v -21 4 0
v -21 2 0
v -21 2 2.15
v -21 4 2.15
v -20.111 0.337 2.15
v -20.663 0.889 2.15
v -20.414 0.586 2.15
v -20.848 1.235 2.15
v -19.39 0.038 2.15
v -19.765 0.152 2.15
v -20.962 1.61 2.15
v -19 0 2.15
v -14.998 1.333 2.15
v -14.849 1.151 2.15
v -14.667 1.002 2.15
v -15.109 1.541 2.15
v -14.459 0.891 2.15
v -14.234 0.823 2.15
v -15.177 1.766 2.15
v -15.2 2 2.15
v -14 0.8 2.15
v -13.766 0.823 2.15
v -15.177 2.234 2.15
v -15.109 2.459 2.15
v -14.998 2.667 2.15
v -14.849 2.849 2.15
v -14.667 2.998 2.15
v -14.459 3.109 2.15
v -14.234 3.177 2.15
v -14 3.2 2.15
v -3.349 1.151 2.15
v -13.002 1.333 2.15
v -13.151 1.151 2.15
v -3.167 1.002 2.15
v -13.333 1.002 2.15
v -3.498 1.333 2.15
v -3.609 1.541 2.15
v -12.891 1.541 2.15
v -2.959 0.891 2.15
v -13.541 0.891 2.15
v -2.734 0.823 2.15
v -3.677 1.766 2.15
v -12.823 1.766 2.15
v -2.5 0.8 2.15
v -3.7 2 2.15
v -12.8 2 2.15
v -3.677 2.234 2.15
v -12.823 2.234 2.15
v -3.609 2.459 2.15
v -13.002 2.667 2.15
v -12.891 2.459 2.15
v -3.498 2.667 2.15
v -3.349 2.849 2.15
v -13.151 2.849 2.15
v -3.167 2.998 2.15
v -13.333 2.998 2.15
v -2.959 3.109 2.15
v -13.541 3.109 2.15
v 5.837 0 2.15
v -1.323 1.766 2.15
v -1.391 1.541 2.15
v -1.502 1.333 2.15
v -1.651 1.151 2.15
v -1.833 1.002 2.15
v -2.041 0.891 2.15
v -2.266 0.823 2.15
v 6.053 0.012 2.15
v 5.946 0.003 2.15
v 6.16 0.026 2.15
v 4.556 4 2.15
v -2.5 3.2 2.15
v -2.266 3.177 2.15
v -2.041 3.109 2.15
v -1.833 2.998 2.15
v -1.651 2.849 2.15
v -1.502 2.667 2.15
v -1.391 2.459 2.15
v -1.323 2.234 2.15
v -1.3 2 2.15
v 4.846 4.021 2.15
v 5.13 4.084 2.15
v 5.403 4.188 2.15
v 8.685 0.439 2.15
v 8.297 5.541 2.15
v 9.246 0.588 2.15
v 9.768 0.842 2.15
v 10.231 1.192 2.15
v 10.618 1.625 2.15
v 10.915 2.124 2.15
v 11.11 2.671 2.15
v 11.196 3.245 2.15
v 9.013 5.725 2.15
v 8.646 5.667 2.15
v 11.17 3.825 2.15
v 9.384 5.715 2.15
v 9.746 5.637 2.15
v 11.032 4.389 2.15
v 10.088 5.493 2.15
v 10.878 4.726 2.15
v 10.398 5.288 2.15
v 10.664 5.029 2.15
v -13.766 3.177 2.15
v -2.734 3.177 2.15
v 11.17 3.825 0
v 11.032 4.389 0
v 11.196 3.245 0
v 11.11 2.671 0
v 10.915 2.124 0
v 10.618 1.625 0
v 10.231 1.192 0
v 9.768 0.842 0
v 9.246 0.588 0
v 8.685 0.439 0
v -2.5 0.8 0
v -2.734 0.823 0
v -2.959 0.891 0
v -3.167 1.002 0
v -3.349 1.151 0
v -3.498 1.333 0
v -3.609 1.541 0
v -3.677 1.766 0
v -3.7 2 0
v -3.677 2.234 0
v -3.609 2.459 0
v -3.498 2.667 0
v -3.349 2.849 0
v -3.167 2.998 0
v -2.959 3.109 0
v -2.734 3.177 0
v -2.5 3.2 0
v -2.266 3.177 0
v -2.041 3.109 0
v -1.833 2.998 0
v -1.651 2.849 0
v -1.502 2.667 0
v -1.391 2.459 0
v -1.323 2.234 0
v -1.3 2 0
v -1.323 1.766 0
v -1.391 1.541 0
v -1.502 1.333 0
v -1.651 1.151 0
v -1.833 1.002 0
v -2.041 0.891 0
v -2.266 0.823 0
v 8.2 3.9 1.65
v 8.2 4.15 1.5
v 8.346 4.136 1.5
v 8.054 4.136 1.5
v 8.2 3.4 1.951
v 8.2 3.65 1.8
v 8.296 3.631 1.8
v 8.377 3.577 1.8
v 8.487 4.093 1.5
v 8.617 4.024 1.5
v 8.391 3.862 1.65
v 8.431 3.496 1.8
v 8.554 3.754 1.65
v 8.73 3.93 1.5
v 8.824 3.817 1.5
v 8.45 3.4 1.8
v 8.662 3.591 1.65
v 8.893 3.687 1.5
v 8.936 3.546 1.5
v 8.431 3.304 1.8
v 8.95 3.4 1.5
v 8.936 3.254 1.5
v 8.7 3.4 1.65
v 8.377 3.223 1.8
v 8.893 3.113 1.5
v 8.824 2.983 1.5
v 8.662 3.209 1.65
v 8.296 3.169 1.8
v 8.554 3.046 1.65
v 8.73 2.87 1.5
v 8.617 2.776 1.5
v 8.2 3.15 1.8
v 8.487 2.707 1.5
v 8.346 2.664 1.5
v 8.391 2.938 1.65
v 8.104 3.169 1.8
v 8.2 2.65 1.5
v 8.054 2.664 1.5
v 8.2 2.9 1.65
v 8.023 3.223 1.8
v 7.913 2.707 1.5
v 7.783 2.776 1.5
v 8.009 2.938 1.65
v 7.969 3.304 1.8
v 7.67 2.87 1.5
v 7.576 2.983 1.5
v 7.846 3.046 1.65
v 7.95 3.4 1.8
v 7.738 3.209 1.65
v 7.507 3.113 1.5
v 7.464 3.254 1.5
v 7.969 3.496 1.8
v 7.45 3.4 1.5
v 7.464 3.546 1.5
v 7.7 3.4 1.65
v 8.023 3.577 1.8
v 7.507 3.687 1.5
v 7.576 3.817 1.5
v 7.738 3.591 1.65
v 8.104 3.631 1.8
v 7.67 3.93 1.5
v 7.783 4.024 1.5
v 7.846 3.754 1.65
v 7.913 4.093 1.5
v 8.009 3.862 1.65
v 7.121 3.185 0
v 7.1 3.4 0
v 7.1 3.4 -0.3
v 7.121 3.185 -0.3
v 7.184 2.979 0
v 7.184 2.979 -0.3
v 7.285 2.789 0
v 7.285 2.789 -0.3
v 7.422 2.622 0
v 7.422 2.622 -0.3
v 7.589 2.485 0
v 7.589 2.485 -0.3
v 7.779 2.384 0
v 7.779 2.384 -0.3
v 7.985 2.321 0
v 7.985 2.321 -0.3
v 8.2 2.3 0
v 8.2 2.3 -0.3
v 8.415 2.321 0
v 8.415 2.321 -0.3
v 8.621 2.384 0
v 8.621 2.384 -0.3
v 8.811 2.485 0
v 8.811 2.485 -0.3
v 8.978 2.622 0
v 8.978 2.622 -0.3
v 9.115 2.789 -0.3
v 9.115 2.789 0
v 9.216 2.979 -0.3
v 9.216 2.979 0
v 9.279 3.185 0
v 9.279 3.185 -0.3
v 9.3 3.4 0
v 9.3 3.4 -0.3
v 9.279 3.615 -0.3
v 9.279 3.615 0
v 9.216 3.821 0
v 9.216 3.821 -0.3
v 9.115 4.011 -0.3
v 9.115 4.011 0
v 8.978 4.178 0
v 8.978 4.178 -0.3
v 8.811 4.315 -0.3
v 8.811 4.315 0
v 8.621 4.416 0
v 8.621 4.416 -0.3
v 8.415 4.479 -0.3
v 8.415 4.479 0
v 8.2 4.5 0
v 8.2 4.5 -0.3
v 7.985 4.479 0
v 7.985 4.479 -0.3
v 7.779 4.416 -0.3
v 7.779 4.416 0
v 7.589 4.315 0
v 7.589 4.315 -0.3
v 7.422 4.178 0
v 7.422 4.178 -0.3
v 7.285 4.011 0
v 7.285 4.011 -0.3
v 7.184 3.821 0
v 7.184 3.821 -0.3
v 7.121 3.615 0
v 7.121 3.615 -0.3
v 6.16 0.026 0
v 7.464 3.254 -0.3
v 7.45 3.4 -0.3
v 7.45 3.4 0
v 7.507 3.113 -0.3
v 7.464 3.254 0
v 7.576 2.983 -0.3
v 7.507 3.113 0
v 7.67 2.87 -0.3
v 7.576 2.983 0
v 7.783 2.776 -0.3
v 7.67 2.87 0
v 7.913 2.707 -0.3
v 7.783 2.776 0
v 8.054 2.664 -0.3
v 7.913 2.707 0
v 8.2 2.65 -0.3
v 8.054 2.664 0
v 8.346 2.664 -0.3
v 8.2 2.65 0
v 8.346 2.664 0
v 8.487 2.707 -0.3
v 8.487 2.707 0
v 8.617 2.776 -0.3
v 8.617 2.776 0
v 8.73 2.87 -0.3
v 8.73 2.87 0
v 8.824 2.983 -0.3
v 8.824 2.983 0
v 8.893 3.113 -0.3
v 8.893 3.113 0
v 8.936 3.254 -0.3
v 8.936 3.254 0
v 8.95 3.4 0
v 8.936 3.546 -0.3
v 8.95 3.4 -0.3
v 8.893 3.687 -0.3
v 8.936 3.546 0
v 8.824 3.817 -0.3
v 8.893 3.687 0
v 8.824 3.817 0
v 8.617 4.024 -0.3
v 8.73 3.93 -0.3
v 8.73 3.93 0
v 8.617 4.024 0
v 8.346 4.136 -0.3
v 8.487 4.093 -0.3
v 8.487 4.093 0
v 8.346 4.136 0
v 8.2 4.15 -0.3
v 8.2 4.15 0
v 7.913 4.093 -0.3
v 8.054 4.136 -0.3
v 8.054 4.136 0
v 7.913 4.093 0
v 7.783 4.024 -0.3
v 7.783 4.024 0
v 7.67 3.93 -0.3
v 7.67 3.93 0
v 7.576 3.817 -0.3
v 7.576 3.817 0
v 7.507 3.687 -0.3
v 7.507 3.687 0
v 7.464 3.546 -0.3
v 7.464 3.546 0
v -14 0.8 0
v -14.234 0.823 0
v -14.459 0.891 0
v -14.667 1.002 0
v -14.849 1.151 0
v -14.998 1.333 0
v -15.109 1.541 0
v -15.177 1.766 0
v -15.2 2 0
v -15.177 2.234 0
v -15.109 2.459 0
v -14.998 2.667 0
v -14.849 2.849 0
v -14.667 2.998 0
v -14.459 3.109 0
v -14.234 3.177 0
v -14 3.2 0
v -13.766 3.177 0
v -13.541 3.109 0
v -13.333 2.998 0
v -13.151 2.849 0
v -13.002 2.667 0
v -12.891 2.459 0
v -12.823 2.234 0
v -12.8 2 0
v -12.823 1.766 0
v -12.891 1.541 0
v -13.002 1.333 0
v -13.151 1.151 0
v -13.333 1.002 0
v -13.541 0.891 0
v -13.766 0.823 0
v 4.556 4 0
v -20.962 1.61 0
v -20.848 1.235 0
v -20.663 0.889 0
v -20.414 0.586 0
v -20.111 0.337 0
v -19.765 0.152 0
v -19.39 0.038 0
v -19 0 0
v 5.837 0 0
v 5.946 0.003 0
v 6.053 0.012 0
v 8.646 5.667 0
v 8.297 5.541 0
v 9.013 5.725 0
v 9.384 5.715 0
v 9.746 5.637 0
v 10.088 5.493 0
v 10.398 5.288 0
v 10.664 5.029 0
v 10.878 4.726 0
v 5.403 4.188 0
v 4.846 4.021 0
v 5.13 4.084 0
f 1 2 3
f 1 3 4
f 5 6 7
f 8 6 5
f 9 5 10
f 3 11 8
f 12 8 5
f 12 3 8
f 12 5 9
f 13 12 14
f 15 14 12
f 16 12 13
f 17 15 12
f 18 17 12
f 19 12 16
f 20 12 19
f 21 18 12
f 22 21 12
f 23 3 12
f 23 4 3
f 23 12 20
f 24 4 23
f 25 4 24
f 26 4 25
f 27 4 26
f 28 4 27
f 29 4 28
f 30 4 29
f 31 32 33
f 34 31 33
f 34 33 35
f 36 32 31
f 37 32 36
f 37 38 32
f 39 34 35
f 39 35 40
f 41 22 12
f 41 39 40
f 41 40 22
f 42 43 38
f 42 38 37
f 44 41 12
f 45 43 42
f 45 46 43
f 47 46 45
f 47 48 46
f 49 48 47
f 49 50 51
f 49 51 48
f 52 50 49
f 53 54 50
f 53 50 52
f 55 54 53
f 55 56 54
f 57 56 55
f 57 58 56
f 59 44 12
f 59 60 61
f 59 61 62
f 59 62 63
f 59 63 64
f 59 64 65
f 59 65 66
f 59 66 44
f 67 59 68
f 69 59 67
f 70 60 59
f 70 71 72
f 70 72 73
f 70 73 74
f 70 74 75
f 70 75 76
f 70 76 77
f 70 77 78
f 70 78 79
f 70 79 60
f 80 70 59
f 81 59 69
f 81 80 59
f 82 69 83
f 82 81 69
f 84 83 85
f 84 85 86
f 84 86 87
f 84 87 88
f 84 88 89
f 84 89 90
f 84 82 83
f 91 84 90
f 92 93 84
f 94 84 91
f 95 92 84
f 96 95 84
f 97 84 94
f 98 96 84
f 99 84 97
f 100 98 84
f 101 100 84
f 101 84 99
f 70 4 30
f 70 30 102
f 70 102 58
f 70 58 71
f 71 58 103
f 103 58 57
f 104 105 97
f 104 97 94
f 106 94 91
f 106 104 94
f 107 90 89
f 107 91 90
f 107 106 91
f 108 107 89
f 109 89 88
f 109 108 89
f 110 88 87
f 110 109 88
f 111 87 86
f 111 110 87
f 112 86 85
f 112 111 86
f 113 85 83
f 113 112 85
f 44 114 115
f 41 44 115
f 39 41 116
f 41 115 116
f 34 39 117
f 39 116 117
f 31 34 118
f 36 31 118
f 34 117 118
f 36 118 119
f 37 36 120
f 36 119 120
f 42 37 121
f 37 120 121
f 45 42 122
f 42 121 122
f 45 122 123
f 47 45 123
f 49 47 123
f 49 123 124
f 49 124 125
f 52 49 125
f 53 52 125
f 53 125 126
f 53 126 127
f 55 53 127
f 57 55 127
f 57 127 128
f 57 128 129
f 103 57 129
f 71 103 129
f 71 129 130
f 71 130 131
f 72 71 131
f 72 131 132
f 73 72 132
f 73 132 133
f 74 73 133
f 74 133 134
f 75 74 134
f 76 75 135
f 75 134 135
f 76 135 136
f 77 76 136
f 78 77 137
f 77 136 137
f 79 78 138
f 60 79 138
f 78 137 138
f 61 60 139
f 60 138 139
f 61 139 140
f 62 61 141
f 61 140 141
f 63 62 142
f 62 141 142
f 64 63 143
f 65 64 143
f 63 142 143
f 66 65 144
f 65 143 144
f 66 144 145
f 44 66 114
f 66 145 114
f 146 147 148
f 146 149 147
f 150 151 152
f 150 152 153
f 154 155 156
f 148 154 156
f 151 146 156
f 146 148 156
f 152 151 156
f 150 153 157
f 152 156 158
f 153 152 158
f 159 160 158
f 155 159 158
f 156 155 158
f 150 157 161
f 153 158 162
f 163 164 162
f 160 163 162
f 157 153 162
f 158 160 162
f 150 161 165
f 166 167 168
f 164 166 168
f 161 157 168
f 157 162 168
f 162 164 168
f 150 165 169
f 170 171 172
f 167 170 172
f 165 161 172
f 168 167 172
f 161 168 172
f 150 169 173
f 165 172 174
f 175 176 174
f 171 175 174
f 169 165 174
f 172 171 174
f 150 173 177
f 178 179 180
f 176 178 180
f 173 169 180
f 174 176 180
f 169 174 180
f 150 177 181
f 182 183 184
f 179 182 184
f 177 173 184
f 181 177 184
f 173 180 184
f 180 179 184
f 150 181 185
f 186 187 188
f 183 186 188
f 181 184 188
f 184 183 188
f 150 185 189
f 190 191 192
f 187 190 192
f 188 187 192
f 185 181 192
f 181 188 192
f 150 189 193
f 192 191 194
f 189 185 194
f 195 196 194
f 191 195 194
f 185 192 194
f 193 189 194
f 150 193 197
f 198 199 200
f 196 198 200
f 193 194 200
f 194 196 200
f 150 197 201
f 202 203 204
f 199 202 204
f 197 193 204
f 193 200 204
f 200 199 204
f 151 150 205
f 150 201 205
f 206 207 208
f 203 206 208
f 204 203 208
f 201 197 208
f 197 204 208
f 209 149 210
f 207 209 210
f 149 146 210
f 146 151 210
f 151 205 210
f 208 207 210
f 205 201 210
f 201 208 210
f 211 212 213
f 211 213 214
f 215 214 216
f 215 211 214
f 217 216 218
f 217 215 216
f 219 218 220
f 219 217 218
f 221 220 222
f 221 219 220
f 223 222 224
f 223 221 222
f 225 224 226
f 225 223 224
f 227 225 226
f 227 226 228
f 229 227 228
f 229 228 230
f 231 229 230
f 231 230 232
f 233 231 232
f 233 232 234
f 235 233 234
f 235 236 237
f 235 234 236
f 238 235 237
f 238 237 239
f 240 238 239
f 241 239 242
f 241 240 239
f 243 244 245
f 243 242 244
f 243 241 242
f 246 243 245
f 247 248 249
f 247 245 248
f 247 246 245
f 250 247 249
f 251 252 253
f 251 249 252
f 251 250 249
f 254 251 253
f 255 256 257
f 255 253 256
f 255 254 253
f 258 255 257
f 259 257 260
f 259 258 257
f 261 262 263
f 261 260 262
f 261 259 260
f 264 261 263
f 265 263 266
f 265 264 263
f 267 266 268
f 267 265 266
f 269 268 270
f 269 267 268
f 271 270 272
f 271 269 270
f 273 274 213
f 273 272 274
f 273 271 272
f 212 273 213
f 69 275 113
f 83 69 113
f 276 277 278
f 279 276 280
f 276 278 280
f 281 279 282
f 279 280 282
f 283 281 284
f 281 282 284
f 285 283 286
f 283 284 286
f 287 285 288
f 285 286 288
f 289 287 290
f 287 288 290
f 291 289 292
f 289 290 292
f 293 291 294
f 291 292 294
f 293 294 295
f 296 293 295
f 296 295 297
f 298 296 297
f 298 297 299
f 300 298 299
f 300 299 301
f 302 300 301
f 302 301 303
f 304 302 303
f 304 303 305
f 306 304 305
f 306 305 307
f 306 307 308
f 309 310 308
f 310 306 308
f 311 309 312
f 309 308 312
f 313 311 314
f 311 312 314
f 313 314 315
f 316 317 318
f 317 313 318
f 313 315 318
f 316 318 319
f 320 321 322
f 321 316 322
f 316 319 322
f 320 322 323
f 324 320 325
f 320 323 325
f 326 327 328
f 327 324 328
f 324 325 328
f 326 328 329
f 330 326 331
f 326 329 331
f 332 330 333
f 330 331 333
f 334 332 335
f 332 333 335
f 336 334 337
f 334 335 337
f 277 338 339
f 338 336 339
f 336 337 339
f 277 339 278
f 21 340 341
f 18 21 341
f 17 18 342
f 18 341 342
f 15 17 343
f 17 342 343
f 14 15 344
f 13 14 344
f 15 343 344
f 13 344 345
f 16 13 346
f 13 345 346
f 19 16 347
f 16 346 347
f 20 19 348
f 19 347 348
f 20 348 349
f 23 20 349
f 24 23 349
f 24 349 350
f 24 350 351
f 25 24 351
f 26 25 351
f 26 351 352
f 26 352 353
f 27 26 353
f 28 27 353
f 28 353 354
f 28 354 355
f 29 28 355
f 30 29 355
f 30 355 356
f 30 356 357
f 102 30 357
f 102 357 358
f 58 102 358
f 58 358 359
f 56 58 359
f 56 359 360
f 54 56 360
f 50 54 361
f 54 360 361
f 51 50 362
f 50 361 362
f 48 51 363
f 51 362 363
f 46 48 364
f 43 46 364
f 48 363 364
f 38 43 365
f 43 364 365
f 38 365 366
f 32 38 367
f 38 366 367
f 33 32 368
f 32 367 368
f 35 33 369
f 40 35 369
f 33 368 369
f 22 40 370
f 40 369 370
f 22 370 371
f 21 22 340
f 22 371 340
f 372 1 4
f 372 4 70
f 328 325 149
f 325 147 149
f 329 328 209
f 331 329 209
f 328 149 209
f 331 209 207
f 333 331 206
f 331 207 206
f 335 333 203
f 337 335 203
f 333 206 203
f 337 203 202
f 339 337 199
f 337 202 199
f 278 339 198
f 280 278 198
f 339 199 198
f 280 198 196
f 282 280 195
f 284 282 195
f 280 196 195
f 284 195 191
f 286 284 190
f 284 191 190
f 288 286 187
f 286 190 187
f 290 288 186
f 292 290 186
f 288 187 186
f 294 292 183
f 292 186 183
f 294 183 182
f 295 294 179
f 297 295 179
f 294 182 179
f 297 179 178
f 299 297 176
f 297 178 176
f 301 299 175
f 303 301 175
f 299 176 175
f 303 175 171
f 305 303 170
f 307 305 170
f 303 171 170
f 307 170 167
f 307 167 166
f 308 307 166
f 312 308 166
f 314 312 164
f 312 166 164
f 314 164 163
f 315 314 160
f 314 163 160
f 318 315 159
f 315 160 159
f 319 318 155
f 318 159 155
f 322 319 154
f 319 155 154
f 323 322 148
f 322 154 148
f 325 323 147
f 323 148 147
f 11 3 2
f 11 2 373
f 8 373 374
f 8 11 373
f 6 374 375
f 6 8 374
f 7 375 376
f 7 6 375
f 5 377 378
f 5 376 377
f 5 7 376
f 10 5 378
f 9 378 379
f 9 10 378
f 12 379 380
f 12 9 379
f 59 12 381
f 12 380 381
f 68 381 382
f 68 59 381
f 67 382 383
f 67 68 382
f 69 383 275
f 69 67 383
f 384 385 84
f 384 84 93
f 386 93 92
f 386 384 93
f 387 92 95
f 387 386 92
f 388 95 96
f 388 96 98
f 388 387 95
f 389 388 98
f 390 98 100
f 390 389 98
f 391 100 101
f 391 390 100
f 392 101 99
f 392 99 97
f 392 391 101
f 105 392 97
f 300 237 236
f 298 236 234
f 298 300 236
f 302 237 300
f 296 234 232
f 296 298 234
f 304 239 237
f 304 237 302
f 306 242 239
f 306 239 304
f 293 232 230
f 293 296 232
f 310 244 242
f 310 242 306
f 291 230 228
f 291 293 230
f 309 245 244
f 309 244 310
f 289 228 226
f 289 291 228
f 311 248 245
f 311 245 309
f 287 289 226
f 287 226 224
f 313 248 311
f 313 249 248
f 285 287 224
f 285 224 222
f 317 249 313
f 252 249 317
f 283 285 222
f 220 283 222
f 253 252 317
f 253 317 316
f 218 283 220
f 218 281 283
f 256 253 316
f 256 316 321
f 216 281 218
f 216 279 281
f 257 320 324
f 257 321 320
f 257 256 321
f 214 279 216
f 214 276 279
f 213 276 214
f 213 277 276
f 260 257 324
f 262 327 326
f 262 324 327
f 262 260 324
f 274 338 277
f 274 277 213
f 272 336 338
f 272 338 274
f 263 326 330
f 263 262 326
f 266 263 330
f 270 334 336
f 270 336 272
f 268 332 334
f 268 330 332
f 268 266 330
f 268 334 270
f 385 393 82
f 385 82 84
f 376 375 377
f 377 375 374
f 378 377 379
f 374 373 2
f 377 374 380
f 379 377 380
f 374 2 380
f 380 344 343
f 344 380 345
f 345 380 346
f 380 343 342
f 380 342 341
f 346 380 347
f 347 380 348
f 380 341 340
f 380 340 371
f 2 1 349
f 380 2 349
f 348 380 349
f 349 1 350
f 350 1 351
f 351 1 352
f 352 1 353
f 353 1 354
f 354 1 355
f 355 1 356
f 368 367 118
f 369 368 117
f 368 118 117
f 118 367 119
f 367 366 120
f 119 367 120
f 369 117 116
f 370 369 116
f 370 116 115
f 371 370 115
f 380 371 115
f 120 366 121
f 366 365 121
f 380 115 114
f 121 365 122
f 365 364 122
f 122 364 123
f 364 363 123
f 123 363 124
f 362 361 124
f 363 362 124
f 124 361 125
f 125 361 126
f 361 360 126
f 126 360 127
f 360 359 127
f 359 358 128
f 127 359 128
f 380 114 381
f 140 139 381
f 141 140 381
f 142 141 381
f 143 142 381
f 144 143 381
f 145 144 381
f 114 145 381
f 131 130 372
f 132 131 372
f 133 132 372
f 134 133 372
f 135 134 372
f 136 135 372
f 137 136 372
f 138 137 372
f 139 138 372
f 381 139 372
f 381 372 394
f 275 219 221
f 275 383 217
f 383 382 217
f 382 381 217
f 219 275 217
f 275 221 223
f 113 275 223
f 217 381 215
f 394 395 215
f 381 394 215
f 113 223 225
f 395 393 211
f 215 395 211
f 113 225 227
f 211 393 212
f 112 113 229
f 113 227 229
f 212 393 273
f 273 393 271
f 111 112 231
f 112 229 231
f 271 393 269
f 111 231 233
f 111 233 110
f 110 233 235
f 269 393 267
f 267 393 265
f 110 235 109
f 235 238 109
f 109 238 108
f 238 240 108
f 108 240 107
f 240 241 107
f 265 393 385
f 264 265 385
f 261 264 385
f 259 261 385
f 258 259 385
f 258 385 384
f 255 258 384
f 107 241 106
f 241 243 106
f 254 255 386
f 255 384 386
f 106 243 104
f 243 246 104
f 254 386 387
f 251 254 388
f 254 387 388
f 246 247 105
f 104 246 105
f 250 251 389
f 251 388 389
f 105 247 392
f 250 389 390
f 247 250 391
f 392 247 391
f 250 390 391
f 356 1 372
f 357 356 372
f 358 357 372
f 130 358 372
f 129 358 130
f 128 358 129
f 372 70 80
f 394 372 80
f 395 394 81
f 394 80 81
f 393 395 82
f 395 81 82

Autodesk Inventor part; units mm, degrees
ref_plane "YZ Plane" through (0, 0, 0) normal (1, 0, 0) x (0, 1, 0)
ref_plane "XZ Plane" through (0, 0, 0) normal (0, 1, 0) x (-1, 0, 0)
ref_plane "XY Plane" through (0, 0, 0) normal (0, 0, 1) x (1, 0, 0)
sketch "Sketch1" plane through (0, 0, 0) normal (0, 0, 1) x (1, 0, 0)
  line L0 (0, 4) -> (0, 0) construction
  arc A0 (8.3449, 0.4035) -> (9.5, 6.1037) centre (8.2, 3.4) ccw
  line L1 (0, 0) -> (-21, 0)
  line L2 (-21, 0) -> (-21, 4)
  line L3 (0, 4) -> (0, 0)
  line L4 (-21, 4) -> (0, 4)
  line L5 (0, 4) -> (5, 4)
  line L6 (5, 4) -> (9.5, 6.1037)
  line L7 (0, 0) -> (6, 0)
  line L8 (6, 0) -> (8.6846, 0.4394)
  dimension "d0" = 8.2
  dimension "d1" = 3.4
  dimension "d3" = 6
  dimension "d47" = 21
  dimension "d57" = 4
  dimension "d66" = 5
  dimension "d67" = 9.5
  dimension "d68" = 6
extrude "Extrusion1" add sketch "Sketch1" along normal blind 2.15
sketch "Sketch6" plane through (0, 0, 0) normal (0, 0, -1) x (-1, 0, 0)
  arc A0 (-9.5, 6.1037) -> (-8.6846, 0.4394) centre (-8.2, 3.4) ccw projected
  point P0 (0, 0)
  point P1 (-3.5529, 0.4208)
  point P2 (-8.8532, 6.2809)
  point P3 (-10.6507, 0.558)
hole "Hole3" at (8.2, 3.4, 0) direction (0, 0, 1) diameter 1.5 depth 1.5 tip angle 118
sketch "Sketch7" plane through (0, 0, 0) normal (0, 0, -1) x (-1, 0, 0)
  circle A0 centre (-8.2, 3.4) radius 0.75 projected
  circle A1 centre (-8.2, 3.4) radius 1.1
  point P0 (0, 0)
  dimension "d44" = 2.2
extrude "Extrusion4" add sketch "Sketch7" along normal blind 0.3
sketch "Sketch8" plane through (0, 0, 2.15) normal (0, 0, 1) x (1, 0, 0)
  arc A0 (8.6846, 0.4394) -> (9.5, 6.1037) centre (8.2, 3.4) ccw projected
  line L0 (-21, 4) -> (-21, 0) projected
  line L1 (-21, 4) -> (-21, 0) projected
  line L2 (-21, 2) -> (-1.49, 2) construction
  line L3 (5, 4) -> (-21, 4) projected
  line L4 (-21, 0) -> (6, 0) projected
  line L5 (6, 0) -> (8.6846, 0.4394) projected
  line L6 (9.5, 6.1037) -> (5, 4) projected
  point P0 (0, 0)
  point P1 (-14, 2)
  point P2 (-2.5, 2)
  dimension "d48" = 7
  dimension "d49" = 2.5
hole "Hole4" at (-14, 2, 2.15) at (-2.5, 2, 2.15) direction (0, 0, -1) diameter 2.4 end through all
fillet "Fillet3" radius 2 1 edges at (9.5, 6.1037, 1.075)
fillet "Fillet5" radius 2 2 edges at (5, 4, 1.075) (6, 0, 1.075)
fillet "Fillet6" radius 2 1 edges at (-21, 0, 1.075)
properties part number "phalanx_1_tendon_support" material "Aluminum 6061"
